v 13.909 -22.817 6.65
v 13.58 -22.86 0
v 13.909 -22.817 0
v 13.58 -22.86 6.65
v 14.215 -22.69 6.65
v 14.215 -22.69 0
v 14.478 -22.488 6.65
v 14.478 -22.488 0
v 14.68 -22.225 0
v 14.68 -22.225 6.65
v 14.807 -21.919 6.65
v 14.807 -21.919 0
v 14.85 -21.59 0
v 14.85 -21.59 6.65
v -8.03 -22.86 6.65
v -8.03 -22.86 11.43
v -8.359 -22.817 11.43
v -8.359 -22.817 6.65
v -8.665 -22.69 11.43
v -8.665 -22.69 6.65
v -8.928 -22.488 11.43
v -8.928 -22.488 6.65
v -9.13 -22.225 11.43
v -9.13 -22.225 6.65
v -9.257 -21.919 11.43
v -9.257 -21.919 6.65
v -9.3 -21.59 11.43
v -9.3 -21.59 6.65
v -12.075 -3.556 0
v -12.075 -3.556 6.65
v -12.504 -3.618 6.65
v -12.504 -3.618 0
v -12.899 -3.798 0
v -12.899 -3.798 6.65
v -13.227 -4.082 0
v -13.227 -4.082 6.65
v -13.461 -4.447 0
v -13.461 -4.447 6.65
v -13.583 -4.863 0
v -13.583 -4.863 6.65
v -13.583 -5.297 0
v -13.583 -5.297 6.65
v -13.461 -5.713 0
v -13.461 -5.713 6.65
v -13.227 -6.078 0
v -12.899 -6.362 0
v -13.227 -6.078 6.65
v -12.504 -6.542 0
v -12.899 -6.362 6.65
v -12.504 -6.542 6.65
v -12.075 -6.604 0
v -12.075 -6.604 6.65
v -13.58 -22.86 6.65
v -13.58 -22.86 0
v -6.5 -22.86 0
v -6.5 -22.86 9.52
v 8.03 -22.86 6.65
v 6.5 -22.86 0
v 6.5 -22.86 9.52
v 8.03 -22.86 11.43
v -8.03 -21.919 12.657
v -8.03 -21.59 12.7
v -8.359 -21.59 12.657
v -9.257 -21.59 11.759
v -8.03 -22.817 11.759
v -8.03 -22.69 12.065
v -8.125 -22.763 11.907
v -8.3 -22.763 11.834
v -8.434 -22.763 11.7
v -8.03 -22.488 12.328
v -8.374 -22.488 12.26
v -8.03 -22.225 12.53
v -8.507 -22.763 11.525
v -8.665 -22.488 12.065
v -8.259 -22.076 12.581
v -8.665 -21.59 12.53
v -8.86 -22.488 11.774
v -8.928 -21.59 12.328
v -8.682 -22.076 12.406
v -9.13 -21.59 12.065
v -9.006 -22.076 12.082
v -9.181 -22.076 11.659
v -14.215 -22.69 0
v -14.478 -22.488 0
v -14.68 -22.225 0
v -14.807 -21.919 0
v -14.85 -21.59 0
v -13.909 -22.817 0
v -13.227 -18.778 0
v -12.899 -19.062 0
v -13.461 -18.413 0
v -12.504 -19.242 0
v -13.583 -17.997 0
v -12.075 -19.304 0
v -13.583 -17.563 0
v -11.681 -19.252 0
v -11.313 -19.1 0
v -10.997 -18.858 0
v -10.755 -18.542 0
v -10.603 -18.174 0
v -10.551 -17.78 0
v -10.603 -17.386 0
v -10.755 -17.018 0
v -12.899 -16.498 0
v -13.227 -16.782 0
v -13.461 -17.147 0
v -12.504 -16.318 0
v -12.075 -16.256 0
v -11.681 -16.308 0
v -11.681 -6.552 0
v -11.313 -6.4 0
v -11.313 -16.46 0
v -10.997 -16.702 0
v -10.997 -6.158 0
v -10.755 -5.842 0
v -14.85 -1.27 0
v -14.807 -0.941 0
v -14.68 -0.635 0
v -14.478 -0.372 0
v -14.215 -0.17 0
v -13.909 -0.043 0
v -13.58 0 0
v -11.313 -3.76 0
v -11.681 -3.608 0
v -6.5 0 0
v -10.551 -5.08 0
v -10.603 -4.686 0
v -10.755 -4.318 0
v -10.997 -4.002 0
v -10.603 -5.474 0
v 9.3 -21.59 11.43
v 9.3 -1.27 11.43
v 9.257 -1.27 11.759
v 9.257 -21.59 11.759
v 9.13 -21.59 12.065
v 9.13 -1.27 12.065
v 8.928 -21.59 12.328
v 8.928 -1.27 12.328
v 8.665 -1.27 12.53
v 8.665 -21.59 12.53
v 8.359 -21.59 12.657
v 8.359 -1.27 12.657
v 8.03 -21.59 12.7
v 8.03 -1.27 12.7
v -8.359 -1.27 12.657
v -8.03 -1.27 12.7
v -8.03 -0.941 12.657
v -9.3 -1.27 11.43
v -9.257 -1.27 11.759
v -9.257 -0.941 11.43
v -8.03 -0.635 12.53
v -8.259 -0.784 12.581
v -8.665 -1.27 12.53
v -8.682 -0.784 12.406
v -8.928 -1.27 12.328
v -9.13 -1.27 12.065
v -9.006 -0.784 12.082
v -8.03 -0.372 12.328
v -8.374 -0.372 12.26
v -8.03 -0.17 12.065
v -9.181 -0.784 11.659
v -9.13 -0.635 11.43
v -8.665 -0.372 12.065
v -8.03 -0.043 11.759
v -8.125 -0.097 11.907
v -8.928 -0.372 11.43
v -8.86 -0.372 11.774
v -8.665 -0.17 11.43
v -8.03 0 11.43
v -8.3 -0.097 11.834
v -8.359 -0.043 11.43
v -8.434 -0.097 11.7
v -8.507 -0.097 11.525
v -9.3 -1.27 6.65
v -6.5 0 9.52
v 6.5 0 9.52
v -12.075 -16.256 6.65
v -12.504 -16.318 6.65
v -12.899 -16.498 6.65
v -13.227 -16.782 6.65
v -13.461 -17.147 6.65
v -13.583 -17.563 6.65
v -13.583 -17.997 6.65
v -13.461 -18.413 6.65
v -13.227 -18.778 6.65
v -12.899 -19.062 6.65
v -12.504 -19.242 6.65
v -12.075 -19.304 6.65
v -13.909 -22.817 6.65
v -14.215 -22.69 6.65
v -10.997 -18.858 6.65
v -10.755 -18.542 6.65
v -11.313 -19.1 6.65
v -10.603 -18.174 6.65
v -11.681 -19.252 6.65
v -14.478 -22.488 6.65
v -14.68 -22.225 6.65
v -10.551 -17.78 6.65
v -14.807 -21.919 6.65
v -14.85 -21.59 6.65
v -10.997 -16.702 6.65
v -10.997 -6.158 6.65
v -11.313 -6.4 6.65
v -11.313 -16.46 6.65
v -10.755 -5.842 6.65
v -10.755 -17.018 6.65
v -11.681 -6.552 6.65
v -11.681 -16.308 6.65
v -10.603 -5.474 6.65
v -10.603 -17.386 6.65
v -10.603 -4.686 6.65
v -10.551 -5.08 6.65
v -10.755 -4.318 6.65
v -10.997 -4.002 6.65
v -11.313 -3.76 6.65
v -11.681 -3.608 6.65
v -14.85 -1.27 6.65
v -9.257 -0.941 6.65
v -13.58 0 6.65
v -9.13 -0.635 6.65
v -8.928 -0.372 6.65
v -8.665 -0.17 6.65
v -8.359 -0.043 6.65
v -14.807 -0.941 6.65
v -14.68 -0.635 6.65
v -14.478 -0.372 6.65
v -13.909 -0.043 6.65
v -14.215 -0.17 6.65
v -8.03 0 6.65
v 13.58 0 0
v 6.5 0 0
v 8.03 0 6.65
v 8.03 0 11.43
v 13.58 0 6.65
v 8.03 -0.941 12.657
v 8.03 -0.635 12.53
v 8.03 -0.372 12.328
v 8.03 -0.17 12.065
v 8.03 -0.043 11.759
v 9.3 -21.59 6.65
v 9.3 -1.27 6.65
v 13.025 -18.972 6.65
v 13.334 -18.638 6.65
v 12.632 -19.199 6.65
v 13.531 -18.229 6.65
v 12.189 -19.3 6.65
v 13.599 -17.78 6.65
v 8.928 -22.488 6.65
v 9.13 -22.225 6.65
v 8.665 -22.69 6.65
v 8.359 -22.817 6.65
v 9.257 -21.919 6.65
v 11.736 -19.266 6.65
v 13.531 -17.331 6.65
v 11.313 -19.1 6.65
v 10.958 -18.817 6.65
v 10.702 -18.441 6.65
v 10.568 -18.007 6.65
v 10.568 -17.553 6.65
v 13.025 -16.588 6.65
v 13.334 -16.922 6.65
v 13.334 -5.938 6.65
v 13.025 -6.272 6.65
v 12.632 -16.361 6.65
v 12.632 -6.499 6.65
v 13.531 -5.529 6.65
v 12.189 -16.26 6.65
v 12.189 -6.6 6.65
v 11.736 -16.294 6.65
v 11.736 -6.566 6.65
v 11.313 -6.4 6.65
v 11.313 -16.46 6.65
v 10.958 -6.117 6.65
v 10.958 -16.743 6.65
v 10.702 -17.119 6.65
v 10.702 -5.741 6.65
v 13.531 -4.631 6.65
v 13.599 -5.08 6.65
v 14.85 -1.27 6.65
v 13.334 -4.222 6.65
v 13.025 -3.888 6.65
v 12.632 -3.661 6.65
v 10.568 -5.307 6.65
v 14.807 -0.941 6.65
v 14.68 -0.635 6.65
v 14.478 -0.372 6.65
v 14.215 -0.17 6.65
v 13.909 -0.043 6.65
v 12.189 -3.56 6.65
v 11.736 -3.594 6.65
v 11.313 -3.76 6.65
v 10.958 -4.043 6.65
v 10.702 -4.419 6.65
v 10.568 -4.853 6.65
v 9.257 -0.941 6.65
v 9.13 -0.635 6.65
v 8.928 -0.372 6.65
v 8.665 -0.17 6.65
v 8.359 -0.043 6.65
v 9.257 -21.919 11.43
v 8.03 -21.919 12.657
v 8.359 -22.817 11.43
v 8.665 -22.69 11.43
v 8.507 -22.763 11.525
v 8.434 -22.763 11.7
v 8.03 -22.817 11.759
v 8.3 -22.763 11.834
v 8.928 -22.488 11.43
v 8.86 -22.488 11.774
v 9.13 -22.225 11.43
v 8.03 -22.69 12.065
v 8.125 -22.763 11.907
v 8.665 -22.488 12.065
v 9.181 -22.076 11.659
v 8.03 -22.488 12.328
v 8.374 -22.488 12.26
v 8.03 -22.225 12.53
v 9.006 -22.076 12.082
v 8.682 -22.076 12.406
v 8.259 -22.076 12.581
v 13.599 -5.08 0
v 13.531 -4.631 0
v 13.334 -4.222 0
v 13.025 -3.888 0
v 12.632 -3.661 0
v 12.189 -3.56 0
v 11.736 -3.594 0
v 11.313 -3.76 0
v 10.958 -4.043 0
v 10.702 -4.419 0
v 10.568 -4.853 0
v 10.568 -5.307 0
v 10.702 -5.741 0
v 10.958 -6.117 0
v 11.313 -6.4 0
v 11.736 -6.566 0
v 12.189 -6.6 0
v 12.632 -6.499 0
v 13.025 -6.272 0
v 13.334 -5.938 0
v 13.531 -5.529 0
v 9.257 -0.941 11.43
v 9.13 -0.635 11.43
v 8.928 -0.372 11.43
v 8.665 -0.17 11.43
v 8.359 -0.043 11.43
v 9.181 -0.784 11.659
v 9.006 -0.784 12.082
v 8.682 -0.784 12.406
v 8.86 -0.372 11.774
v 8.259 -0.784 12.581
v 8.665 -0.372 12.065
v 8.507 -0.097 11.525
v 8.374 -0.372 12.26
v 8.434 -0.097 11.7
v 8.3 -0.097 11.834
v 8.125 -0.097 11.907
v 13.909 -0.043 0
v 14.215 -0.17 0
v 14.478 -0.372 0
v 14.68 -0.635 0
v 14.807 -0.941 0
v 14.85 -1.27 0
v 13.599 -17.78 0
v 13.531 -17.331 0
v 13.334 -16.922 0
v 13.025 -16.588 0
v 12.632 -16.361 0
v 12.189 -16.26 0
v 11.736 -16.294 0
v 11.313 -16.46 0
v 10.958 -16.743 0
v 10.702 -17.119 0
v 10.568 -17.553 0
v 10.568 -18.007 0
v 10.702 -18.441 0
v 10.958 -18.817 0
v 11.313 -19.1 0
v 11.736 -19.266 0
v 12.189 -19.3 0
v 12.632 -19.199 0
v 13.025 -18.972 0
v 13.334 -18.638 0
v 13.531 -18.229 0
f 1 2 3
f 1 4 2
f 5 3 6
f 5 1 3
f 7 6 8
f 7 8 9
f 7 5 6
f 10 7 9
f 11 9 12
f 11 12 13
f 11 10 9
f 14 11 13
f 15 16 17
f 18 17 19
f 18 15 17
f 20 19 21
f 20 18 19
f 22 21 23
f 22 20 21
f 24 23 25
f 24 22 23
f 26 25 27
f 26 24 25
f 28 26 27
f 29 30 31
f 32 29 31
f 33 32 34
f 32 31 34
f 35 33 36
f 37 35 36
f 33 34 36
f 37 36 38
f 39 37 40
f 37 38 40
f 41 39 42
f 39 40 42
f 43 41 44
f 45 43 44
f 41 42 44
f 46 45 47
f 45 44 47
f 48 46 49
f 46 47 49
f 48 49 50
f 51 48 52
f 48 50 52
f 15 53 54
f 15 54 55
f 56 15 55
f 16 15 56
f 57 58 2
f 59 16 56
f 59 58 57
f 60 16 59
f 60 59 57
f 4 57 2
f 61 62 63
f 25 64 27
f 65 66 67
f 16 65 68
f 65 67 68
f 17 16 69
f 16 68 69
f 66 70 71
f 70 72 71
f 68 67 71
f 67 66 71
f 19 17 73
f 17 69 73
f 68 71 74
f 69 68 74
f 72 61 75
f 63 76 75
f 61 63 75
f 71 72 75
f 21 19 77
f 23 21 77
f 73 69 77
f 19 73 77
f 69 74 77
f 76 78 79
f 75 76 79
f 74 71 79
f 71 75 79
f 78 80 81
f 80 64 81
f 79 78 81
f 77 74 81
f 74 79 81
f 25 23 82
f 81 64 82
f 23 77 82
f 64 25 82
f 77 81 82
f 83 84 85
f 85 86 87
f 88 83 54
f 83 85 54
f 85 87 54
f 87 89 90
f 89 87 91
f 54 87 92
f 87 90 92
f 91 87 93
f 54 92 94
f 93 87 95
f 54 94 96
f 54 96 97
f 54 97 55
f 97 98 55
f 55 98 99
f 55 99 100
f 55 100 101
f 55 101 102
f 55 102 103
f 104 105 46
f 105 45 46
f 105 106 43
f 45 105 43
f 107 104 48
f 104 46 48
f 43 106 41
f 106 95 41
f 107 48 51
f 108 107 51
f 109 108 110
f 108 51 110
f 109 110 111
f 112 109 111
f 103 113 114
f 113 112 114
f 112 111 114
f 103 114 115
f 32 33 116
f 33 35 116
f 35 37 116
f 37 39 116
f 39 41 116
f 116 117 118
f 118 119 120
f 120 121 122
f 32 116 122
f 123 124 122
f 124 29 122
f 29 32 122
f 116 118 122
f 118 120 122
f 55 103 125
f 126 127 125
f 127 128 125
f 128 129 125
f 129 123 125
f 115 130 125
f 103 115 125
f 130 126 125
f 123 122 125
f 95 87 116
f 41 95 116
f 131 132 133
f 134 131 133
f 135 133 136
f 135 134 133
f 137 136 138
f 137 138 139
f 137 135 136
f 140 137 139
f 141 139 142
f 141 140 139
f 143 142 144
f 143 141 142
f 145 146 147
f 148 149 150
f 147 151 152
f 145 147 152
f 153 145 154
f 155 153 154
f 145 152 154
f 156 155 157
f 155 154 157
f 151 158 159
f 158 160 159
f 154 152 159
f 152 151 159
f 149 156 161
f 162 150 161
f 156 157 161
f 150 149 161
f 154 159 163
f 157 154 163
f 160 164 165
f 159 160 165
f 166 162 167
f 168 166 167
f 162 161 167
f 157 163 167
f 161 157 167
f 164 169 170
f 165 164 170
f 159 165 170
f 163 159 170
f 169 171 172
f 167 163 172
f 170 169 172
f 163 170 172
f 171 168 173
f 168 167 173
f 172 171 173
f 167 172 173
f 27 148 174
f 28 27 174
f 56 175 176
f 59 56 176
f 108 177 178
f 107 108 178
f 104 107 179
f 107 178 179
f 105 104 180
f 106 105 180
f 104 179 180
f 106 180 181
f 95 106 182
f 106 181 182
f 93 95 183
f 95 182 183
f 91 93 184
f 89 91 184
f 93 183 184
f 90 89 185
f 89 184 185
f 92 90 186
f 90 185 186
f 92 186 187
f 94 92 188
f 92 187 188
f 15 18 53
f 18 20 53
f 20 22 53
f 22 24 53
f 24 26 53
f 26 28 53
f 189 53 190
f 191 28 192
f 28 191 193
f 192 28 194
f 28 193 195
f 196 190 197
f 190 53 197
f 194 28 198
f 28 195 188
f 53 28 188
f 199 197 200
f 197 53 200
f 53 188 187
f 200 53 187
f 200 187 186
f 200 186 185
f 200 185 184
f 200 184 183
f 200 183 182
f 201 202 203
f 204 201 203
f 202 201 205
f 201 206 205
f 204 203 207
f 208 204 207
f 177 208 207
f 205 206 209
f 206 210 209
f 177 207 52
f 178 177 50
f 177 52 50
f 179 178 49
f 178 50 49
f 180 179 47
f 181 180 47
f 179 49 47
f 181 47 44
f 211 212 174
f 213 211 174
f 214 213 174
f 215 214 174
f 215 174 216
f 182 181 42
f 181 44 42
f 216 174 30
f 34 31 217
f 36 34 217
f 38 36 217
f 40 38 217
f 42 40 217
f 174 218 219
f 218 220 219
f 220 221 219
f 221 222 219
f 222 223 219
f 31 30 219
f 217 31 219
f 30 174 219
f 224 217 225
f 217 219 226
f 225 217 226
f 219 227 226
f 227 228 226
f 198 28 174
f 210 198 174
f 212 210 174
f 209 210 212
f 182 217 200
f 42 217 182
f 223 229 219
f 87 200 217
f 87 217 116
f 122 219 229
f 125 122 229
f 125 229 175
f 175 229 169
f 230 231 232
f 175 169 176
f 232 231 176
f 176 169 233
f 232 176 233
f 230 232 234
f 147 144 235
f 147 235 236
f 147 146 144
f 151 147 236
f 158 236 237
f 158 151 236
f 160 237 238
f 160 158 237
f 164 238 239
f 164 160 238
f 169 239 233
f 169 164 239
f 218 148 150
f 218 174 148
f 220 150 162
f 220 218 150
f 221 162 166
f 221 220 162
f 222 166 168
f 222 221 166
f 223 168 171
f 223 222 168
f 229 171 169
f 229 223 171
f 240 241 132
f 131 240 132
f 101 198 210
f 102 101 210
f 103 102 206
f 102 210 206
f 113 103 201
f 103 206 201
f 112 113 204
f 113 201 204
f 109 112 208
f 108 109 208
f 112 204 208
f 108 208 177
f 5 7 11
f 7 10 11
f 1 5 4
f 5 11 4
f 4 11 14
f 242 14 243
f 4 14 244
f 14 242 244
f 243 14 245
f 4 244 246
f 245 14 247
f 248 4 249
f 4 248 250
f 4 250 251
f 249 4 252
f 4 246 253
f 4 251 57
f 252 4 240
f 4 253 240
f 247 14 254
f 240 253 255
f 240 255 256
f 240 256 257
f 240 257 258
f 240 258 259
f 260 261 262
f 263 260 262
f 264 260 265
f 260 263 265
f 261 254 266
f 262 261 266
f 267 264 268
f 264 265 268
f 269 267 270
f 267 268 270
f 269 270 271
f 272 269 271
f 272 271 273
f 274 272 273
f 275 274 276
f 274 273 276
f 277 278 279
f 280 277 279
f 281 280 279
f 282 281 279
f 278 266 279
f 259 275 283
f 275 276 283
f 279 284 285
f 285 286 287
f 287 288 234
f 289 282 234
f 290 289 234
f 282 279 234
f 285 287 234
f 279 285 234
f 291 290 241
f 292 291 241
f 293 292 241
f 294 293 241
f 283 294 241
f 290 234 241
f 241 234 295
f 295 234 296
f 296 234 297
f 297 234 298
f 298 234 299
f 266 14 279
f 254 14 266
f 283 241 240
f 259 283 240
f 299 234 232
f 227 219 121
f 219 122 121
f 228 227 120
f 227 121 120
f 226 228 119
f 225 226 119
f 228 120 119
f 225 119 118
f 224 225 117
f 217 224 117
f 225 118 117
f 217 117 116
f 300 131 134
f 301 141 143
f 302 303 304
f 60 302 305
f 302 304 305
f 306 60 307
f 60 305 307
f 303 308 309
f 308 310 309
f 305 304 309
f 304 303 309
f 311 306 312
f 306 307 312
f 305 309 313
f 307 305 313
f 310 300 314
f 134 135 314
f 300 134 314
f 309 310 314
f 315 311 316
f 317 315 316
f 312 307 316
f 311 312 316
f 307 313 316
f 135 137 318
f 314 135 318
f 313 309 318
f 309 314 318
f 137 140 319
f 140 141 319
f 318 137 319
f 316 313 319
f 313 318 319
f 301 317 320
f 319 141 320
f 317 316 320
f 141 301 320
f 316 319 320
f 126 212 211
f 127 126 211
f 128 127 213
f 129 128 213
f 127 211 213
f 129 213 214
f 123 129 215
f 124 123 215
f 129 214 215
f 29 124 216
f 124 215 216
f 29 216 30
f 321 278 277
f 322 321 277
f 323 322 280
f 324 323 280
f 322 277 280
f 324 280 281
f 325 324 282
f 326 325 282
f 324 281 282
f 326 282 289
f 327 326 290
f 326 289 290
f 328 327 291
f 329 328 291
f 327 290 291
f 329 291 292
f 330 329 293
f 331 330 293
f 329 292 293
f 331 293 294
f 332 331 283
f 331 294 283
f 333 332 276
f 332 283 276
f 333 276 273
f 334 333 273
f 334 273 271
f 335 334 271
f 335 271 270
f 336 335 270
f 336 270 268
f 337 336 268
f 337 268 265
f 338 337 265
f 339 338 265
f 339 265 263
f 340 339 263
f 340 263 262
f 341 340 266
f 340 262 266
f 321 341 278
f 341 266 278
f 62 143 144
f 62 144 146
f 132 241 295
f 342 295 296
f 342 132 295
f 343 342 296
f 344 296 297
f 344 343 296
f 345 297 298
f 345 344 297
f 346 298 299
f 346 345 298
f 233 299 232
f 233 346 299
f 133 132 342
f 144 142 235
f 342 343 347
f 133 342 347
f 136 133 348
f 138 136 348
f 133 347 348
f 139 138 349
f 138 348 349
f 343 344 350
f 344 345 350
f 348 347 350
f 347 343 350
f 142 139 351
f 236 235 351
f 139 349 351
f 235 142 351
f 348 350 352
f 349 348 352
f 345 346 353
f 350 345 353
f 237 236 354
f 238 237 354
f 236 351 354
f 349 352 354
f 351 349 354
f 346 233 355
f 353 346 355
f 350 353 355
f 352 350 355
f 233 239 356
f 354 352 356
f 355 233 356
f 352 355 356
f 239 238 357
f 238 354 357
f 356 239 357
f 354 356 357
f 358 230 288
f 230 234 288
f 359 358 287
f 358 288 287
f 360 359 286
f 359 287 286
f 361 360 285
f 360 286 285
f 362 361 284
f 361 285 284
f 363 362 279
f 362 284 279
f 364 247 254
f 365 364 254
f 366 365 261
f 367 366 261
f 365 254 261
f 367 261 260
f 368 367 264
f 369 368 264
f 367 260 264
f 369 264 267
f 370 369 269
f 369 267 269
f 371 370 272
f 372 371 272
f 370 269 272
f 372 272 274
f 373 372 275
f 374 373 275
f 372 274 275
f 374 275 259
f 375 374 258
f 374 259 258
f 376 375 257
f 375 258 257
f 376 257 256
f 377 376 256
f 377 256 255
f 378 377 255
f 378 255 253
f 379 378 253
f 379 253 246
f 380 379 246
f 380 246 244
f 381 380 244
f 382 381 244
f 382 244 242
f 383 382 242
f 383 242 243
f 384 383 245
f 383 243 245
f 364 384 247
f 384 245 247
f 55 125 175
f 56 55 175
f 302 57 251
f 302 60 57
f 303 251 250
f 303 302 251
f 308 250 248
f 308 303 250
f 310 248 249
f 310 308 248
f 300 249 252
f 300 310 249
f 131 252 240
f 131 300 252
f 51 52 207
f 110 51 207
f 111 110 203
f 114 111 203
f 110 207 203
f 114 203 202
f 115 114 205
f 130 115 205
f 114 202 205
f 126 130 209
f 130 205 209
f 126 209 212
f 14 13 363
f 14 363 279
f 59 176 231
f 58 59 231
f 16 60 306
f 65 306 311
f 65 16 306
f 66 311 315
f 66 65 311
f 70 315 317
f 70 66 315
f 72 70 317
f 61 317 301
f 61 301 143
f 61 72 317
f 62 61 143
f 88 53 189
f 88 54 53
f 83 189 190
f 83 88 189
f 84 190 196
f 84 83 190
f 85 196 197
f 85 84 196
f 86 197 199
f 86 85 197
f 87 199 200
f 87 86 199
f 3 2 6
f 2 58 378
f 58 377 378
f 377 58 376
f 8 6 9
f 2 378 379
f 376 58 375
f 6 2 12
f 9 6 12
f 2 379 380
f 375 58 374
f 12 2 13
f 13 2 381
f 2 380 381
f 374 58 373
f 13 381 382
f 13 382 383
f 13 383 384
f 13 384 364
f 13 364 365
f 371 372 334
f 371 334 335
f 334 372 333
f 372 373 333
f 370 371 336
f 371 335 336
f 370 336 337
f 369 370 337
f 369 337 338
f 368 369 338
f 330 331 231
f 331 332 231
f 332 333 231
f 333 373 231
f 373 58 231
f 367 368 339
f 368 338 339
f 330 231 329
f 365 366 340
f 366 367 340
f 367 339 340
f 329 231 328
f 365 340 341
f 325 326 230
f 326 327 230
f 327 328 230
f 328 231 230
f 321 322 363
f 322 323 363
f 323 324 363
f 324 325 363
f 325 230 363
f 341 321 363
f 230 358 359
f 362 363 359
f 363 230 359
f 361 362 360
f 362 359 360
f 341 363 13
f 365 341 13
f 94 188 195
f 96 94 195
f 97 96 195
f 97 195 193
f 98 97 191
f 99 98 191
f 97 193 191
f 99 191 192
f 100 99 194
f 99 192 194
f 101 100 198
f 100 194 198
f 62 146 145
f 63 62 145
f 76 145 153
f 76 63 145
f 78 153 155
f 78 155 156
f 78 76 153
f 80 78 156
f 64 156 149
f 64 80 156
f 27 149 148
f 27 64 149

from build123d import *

# Parameters (mm, degrees)
F1_DEPTH = 22.86
F2_R     = 1.27
F3_R     = 1.524
F4_DEPTH = 6.65
F5_R     = 1.27


with BuildPart() as f1:
    # F0 (on Front) → F1 (new body)
    with BuildSketch(Plane.XZ):
        Polygon((-14.85, 6.65), (-14.85, 0), (-6.5, 0), (-6.5, 9.52), (0, 9.52), (0, 12.7), (-9.3, 12.7), (-9.3, 6.65), align=None)
        Polygon((0, 12.7), (0, 9.52), (6.5, 9.52), (6.5, 0), (14.85, 0), (14.85, 6.65), (9.3, 6.65), (9.3, 12.7), align=None)
    extrude(amount=F1_DEPTH)

    # F2
    f2_edges = [f1.edges().sort_by_distance(p)[0] for p in [
        (9.3, -11.43, 12.7),
        (-9.3, -11.43, 12.7),
    ]]
    fillet(f2_edges, radius=F2_R)

    # F3 (on face) → F4 (cut, through all)
    with BuildSketch(Plane.XY.offset(6.65)):
        with BuildLine():
            ThreePointArc((-10.551, -5.08), (-10.997369, -4.002369), (-12.075, -3.556))
            Line((-12.075, -3.556), (-12.075, -5.08))
            Line((-12.075, -5.08), (-12.075, -6.604))
            ThreePointArc((-12.075, -6.604), (-10.997369, -6.157631), (-10.551, -5.08))
        make_face()
        with BuildLine():
            ThreePointArc((-10.551, -17.78), (-10.997369, -16.702369), (-12.075, -16.256))
            Line((-12.075, -16.256), (-12.075, -17.78))
            Line((-12.075, -17.78), (-12.075, -19.304))
            ThreePointArc((-12.075, -19.304), (-10.997369, -18.857631), (-10.551, -17.78))
        make_face()
        with BuildLine():
            Line((-12.075, -17.78), (-12.075, -16.256))
            ThreePointArc((-12.075, -16.256), (-13.599, -17.78), (-12.075, -19.304))
            Line((-12.075, -19.304), (-12.075, -17.78))
        make_face()
        with BuildLine():
            Line((-12.075, -5.08), (-12.075, -3.556))
            ThreePointArc((-12.075, -3.556), (-13.599, -5.08), (-12.075, -6.604))
            Line((-12.075, -6.604), (-12.075, -5.08))
        make_face()
        with Locations((12.075, -5.08)):
            Circle(F3_R)
        with Locations((12.075, -17.78)):
            Circle(F3_R)
    extrude(amount=-F4_DEPTH, mode=Mode.SUBTRACT)

    # F5
    f5_edges = [f1.edges().sort_by_distance(p)[0] for p in [
        (14.85, 0, 3.325),
        (9.3, 0, 9.04),
        (-14.85, 0, 3.325),
        (-9.3, -22.86, 9.04),
        (-14.85, -22.86, 3.325),
        (14.85, -22.86, 3.325),
    ]]
    fillet(f5_edges, radius=F5_R)


solid = f1.part
